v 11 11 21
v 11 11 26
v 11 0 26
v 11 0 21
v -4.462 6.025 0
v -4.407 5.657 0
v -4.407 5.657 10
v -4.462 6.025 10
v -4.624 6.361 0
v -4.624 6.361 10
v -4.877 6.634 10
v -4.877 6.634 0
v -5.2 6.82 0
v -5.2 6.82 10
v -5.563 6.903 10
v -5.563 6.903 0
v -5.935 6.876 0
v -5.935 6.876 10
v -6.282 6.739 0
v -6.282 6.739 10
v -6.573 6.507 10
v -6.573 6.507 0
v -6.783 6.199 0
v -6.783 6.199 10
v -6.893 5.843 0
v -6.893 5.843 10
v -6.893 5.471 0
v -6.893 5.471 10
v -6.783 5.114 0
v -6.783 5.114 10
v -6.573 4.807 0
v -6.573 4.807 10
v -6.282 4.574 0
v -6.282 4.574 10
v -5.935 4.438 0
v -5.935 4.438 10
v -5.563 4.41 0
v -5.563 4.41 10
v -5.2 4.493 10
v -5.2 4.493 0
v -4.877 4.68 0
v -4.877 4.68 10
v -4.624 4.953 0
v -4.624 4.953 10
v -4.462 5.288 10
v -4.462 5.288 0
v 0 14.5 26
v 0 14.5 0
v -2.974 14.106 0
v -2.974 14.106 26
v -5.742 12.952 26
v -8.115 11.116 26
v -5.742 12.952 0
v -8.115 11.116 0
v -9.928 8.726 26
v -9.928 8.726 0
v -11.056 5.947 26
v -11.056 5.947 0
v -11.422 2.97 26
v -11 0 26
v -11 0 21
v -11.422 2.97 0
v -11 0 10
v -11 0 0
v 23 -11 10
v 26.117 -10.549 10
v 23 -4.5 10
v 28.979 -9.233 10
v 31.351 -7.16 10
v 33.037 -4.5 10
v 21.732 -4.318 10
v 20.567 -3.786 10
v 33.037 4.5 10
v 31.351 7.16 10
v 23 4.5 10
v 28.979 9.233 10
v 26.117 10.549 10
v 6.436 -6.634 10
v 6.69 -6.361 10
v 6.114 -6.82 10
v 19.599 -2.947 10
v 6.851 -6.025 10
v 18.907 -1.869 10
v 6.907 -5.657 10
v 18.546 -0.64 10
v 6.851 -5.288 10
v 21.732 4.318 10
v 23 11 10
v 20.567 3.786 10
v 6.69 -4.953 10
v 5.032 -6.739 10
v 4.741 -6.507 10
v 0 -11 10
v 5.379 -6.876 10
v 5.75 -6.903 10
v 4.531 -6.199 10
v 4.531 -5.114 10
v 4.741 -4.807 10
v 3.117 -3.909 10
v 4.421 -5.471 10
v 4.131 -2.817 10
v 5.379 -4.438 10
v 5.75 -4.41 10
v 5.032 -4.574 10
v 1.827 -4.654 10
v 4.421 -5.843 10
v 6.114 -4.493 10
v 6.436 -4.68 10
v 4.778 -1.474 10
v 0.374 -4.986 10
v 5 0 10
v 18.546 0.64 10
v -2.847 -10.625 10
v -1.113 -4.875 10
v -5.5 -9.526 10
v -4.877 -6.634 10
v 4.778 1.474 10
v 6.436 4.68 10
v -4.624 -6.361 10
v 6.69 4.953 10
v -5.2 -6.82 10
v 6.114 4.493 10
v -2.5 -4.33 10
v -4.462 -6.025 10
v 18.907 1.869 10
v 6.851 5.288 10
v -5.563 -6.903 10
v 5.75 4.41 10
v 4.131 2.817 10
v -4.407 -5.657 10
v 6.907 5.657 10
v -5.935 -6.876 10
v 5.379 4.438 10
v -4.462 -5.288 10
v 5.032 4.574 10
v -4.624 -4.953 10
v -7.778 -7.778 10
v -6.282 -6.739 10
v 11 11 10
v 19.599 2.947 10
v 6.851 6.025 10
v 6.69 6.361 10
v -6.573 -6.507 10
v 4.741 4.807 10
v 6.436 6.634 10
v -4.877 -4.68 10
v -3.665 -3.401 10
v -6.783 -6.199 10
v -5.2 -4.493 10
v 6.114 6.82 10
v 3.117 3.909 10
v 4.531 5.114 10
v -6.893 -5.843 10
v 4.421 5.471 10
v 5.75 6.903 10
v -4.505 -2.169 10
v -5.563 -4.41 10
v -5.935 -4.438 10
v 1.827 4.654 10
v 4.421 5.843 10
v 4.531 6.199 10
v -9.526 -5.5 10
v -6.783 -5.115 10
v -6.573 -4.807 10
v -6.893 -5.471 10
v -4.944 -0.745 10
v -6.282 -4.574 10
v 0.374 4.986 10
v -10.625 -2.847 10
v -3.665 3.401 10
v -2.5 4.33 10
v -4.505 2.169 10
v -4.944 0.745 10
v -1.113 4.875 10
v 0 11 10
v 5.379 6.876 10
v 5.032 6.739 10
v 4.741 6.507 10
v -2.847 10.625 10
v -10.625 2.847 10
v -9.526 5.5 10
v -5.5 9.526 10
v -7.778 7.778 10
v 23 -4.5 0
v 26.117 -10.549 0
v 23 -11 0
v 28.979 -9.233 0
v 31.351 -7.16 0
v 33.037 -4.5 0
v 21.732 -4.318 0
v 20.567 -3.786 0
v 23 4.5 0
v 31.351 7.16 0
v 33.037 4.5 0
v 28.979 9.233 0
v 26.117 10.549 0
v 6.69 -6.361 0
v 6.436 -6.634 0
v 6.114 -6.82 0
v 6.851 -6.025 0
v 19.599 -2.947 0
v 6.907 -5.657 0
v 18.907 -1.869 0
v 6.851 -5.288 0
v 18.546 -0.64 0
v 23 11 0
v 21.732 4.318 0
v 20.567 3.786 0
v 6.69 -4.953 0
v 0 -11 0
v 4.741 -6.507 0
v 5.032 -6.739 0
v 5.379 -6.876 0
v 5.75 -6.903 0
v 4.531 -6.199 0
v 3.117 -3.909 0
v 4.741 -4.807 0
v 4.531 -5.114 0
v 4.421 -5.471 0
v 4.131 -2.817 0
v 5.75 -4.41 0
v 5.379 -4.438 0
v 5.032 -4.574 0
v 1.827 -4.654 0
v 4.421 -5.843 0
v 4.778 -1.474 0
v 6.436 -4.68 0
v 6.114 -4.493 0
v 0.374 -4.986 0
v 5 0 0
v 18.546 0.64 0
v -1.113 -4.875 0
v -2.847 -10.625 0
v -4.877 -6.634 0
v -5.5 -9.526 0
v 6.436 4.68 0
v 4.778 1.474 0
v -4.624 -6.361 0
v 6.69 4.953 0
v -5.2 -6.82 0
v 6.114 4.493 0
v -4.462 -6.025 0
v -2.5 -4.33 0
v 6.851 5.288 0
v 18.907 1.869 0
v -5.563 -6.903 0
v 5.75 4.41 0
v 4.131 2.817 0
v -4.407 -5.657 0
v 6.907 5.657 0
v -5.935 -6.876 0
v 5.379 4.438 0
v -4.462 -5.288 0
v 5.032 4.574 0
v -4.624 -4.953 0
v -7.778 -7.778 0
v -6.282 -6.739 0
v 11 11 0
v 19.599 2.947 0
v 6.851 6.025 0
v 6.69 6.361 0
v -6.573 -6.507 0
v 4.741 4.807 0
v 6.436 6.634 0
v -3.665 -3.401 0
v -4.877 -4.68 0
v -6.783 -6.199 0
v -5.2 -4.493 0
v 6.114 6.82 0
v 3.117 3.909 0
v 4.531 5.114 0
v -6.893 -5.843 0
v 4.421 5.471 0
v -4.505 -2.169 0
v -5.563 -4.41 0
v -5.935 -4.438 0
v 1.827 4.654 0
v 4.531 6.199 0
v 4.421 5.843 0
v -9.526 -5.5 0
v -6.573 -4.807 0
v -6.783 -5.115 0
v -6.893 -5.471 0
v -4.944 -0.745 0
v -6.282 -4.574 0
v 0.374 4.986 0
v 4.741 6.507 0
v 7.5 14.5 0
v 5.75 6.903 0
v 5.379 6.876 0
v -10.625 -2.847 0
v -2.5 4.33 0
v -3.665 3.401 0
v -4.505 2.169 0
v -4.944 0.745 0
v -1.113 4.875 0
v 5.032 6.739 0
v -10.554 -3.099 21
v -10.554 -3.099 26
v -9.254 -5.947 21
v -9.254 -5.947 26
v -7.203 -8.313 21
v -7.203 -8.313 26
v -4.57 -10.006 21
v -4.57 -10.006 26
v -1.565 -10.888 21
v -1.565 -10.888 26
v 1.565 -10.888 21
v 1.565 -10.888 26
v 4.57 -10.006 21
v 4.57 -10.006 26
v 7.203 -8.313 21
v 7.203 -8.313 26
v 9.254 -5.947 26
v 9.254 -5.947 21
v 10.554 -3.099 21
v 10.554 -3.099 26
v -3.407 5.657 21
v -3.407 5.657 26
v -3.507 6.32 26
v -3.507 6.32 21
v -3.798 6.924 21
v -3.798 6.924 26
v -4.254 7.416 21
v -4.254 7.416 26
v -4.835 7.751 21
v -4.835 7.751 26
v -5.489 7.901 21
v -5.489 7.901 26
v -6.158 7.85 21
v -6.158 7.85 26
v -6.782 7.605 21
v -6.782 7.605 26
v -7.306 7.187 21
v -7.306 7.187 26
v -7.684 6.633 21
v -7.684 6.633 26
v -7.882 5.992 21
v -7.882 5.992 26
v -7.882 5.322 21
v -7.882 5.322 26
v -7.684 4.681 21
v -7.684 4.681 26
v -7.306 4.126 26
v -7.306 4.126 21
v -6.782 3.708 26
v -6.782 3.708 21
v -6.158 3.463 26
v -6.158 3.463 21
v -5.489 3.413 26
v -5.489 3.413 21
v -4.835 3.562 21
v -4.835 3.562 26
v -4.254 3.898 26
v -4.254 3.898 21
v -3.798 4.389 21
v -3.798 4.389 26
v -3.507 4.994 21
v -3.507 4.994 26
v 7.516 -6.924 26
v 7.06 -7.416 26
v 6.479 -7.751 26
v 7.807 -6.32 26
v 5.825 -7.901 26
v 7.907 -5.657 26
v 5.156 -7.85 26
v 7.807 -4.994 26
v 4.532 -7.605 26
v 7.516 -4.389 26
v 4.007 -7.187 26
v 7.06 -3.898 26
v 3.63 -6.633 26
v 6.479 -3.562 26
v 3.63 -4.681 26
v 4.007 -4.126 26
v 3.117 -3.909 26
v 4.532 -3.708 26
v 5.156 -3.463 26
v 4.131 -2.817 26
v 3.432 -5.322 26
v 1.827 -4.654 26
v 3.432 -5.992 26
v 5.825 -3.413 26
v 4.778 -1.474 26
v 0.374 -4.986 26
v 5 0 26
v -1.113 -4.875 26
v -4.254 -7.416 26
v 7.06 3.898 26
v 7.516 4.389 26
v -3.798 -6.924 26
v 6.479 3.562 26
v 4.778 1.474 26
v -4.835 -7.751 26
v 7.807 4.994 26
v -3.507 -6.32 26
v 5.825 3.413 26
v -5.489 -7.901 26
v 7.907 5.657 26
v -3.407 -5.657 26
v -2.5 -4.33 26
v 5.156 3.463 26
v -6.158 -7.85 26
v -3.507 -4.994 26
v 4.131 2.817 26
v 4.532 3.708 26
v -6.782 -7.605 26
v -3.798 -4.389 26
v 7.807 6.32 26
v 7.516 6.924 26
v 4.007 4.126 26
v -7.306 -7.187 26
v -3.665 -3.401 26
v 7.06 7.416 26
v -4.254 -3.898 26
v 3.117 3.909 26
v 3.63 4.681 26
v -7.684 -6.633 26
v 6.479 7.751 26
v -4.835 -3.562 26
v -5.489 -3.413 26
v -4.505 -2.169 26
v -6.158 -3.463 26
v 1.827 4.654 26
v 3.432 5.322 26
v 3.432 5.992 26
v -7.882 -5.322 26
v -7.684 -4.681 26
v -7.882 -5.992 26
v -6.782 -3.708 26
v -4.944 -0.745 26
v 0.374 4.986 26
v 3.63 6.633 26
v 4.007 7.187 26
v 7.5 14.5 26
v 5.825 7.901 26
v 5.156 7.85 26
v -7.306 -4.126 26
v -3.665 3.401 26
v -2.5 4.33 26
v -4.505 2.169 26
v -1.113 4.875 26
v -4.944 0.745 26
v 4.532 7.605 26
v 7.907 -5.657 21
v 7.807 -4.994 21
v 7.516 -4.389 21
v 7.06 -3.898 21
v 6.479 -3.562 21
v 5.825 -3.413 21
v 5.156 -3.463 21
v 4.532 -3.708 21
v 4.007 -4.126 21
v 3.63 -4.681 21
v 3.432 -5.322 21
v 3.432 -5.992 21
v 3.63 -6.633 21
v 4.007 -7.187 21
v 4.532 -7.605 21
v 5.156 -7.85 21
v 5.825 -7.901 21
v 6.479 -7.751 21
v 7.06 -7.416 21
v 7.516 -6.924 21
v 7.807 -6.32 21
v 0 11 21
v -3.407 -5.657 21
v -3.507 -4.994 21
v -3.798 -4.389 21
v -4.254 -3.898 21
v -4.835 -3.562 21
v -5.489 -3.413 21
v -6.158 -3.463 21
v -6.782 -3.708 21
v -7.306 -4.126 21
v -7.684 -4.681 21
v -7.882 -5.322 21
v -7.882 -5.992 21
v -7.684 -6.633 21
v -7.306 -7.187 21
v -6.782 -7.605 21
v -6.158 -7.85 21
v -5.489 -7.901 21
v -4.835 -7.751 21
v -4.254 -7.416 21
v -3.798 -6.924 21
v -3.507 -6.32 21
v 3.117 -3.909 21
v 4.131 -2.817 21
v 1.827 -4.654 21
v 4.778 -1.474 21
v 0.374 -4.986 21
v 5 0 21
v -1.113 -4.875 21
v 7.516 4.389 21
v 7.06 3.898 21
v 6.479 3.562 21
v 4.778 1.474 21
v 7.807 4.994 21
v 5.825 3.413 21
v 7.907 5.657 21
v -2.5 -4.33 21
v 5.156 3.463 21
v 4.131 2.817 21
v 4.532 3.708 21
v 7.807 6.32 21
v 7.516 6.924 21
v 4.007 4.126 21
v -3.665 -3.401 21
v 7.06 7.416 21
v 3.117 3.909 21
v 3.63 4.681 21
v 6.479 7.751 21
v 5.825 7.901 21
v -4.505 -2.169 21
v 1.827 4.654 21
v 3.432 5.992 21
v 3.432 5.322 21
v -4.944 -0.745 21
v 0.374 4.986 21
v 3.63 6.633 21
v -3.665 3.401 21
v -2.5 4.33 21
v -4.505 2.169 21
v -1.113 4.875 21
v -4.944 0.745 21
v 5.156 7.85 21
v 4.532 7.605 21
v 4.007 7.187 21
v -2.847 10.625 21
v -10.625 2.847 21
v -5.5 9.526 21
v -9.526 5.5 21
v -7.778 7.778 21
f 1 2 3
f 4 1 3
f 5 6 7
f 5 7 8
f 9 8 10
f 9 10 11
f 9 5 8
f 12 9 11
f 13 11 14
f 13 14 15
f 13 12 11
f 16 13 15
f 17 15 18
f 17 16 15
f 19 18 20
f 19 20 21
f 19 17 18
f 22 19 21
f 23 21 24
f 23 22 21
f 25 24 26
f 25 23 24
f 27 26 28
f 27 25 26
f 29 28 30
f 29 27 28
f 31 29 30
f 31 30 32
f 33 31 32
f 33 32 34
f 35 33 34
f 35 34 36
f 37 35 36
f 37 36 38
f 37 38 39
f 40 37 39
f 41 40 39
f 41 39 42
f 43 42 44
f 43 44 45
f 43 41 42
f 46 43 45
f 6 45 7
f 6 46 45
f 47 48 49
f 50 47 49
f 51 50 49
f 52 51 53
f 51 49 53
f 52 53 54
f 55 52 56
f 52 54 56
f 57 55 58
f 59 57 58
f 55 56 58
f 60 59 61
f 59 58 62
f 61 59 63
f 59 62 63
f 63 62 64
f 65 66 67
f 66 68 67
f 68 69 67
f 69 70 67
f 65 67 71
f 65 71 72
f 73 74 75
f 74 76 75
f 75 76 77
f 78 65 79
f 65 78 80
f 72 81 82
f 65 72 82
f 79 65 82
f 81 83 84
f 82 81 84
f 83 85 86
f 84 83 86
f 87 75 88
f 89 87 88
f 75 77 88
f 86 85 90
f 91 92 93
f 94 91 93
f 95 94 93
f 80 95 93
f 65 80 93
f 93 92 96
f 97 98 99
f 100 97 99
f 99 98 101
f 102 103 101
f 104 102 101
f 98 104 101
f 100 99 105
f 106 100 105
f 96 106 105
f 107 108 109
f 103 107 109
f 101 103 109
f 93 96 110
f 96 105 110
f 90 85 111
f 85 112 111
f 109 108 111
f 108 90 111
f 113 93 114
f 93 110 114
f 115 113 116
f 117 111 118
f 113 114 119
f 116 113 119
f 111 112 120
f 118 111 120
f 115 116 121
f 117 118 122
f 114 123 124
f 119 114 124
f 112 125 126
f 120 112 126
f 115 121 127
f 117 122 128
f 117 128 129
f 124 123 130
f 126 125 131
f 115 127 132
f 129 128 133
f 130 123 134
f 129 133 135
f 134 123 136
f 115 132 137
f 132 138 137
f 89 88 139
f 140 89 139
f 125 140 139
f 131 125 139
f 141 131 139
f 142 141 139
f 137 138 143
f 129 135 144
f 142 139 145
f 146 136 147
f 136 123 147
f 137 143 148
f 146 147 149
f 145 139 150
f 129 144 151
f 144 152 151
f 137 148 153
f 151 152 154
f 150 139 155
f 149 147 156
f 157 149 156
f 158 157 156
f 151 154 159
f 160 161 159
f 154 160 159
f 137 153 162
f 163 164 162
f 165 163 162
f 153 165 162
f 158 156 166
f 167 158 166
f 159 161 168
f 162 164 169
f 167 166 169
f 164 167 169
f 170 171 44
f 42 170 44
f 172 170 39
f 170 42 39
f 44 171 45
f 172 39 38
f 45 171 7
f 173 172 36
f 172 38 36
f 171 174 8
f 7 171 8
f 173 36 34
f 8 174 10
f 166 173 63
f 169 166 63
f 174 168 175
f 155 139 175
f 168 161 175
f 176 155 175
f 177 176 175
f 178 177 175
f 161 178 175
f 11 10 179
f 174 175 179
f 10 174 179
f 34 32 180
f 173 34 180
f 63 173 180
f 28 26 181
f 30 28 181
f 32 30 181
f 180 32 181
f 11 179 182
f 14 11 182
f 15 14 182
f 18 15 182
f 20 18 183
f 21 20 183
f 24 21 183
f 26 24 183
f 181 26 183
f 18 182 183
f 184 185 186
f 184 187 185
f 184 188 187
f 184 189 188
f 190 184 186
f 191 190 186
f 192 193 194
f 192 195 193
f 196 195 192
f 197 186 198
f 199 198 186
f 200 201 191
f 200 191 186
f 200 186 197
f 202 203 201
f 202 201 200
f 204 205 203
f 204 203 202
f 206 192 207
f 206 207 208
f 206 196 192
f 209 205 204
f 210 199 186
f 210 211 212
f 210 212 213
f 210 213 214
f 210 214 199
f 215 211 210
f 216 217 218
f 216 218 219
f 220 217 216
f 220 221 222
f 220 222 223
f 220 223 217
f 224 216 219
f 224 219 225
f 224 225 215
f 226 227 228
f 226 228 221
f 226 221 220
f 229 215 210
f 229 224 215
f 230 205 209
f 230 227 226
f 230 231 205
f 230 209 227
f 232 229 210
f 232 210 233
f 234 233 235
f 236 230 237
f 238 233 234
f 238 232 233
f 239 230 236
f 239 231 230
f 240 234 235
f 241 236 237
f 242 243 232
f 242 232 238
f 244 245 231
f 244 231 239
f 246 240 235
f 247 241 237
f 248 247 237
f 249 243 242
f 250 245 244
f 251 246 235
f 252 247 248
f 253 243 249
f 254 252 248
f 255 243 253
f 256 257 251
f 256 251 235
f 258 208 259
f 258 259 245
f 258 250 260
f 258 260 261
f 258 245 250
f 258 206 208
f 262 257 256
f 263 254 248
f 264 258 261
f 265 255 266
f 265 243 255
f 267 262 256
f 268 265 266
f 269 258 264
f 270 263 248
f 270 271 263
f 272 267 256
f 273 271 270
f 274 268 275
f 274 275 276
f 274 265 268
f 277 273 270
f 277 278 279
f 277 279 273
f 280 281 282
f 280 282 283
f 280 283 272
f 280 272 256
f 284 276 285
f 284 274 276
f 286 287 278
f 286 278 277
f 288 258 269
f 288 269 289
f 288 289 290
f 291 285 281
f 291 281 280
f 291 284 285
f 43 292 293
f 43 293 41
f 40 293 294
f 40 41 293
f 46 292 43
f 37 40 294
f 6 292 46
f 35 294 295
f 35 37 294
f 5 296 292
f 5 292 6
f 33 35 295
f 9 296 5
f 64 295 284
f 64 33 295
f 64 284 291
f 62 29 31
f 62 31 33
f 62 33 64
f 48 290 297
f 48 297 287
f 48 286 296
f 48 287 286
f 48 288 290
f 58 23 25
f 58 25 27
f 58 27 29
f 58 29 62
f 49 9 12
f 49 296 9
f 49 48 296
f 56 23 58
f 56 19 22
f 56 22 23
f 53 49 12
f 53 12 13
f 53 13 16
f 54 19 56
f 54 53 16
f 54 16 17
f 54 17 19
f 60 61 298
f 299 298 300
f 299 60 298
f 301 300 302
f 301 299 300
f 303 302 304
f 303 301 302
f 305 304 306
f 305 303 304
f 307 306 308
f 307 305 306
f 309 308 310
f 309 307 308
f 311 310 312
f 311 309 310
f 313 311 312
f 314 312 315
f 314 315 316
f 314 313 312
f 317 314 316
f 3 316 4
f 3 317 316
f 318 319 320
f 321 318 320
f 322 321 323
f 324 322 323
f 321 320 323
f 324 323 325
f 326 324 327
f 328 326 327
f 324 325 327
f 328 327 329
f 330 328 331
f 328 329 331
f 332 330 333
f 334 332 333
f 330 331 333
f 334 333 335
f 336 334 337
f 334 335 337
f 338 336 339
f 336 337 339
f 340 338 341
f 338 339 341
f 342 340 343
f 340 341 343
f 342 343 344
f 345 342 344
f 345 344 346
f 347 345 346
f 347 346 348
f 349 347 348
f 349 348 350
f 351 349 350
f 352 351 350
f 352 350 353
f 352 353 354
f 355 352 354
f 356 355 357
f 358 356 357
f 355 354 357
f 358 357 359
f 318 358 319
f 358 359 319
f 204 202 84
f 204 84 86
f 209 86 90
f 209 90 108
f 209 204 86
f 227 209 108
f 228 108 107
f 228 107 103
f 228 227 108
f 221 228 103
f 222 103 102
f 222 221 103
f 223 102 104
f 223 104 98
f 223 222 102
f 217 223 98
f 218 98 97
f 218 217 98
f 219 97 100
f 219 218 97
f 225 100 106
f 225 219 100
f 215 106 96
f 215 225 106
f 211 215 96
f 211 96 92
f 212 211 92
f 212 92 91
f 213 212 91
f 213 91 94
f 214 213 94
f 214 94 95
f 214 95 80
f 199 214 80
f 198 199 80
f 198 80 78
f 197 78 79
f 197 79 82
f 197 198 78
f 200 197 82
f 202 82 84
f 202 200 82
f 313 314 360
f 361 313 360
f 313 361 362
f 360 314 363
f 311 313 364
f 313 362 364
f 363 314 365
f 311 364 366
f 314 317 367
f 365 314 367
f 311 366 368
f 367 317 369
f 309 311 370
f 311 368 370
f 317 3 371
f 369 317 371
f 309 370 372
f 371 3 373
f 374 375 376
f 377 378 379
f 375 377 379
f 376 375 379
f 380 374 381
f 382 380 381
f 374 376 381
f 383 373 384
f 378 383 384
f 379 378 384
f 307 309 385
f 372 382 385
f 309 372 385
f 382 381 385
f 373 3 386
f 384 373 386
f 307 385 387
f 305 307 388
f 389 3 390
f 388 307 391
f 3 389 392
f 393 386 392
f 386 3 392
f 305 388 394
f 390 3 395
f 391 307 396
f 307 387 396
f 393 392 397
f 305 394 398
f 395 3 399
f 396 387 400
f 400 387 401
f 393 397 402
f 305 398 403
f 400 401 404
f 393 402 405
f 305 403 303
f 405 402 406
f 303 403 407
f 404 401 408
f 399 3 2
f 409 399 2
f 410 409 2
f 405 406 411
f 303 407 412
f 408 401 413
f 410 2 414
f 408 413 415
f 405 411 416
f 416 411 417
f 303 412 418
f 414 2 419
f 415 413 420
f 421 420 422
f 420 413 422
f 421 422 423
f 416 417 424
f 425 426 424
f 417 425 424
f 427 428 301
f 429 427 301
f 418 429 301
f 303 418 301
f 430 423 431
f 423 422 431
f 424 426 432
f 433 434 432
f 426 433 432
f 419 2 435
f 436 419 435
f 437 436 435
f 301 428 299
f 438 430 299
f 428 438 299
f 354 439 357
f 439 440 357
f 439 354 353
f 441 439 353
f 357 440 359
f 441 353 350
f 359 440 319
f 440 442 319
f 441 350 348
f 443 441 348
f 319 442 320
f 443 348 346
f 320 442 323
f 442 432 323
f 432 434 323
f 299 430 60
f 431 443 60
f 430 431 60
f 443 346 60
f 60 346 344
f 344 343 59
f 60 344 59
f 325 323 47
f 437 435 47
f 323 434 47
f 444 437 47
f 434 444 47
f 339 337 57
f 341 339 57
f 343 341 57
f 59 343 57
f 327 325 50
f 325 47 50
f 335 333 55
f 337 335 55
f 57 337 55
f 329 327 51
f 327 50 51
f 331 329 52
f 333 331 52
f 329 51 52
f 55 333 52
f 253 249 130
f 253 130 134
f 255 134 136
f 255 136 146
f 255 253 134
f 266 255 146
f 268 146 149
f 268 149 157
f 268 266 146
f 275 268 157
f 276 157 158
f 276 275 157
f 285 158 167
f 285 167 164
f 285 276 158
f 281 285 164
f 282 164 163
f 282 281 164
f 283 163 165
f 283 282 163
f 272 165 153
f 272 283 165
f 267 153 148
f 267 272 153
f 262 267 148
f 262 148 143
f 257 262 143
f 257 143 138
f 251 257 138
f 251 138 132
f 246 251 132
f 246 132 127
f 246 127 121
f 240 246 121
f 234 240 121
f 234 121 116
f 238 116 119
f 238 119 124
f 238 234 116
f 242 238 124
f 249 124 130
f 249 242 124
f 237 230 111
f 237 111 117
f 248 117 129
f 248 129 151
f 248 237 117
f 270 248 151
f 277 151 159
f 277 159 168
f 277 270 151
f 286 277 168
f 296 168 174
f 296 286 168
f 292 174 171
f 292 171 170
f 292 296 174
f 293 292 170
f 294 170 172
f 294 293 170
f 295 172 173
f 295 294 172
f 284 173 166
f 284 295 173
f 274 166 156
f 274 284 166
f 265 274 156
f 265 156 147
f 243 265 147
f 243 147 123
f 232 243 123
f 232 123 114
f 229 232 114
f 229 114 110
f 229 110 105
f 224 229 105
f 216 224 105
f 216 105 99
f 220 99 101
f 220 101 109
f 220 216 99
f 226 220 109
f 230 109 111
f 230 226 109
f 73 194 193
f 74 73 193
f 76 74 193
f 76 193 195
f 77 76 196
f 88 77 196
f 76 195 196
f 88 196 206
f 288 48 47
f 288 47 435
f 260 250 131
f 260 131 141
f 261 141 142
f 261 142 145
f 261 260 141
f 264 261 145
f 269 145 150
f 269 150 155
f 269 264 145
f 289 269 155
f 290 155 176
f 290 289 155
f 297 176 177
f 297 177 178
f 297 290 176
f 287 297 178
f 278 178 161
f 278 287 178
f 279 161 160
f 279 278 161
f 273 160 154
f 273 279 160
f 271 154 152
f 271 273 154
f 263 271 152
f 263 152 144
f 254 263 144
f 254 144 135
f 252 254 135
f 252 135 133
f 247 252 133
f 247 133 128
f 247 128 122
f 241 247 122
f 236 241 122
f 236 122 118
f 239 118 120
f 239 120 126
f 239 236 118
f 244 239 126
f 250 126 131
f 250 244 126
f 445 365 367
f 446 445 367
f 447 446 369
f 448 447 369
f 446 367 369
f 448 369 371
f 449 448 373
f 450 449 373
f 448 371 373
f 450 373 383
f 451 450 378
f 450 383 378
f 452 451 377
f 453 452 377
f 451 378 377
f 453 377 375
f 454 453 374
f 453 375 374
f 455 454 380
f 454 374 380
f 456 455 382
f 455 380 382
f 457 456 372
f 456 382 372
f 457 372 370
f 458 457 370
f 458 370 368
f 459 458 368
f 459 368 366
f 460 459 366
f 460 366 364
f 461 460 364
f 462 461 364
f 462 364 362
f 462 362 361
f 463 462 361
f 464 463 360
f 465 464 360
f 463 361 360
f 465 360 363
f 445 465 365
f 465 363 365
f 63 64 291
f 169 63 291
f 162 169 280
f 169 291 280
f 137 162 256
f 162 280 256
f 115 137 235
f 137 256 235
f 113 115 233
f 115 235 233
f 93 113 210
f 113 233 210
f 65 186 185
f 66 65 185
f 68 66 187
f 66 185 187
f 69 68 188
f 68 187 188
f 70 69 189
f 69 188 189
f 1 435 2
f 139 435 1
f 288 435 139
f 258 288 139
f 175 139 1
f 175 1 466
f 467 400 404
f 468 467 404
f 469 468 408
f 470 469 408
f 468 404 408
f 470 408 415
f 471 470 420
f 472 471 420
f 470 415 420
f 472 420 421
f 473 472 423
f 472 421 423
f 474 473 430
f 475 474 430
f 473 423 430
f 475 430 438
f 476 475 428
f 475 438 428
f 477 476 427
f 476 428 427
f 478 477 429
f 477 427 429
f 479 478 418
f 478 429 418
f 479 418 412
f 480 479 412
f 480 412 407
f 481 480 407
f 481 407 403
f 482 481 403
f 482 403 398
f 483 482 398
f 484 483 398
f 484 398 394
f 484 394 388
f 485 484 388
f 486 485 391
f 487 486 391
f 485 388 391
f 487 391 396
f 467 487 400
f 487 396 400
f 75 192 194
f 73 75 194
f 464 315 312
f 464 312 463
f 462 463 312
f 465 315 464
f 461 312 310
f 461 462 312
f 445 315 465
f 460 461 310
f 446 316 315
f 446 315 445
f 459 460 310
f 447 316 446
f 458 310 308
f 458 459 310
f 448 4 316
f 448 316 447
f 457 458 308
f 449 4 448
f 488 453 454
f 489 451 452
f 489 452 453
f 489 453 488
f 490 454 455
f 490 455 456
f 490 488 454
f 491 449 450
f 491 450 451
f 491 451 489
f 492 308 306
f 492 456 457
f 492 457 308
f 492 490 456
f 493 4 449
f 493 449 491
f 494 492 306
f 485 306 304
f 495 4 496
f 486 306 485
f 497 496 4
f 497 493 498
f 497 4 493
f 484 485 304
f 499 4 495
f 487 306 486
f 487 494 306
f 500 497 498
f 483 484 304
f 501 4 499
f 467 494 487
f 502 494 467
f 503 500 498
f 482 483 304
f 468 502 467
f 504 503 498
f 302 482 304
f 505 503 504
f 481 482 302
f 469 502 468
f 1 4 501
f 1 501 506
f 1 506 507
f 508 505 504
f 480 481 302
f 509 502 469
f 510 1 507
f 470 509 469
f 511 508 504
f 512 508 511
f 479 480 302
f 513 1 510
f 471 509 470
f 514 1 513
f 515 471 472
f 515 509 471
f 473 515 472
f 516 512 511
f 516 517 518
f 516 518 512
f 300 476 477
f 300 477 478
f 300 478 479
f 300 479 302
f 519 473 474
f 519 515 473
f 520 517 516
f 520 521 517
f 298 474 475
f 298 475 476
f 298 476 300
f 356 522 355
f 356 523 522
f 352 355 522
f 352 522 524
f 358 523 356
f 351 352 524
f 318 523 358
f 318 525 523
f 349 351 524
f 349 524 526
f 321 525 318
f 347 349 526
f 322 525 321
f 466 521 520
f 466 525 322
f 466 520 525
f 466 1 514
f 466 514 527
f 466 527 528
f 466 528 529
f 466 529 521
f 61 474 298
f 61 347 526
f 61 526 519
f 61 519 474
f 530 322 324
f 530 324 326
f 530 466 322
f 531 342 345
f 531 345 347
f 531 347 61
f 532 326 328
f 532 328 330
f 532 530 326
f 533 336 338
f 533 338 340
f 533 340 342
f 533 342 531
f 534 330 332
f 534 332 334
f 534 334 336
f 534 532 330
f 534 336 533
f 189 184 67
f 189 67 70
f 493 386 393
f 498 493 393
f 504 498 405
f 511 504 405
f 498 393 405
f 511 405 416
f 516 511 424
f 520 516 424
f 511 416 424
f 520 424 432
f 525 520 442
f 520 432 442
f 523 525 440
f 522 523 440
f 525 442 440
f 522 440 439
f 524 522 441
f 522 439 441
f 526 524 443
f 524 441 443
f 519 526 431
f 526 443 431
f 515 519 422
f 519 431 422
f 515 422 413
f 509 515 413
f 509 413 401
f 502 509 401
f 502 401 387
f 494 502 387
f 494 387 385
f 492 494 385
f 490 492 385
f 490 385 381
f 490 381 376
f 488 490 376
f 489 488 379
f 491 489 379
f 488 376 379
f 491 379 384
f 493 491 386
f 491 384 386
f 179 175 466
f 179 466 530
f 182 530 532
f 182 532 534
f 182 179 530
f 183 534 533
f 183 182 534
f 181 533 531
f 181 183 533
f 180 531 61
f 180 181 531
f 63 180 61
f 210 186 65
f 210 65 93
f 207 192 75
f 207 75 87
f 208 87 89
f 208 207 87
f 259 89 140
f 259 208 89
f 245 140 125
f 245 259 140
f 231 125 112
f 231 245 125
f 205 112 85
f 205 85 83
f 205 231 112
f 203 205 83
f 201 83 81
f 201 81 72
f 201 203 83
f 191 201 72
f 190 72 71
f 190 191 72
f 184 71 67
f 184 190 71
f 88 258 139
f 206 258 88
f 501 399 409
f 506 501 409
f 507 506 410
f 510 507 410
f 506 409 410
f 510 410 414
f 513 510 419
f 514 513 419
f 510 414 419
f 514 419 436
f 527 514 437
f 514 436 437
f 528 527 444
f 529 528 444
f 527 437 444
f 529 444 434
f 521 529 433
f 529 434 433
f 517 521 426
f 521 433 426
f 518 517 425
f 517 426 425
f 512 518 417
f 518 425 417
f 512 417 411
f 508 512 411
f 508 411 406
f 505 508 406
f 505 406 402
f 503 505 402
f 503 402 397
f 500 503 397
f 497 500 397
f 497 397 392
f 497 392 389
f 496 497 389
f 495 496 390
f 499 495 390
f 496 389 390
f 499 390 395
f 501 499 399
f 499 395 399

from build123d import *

# Parameters (mm, degrees)
SKETCH_R      = 5
SKETCH_R_2    = 1.25
PAD_DEPTH     = 10
PAD001_DEPTH  = 26
SKETCH003_R   = 2.25
SKETCH003_R_2 = 5
PAD002_DEPTH  = 5


with BuildPart() as part:
    # Sketch → Pad (new body)
    with BuildSketch(Plane.XY):
        with BuildLine():
            Line((0, 11), (23, 11))
            ThreePointArc((33.0374299499, 4.5), (28.9791303716, 9.2330926563), (23, 11))
            Line((23, 4.5), (33.0374299499, 4.5))
            ThreePointArc((23, 4.5), (18.5, 0), (23, -4.5))
            Line((23, -4.5), (33.0374299499, -4.5))
            ThreePointArc((23, -11), (28.9791303716, -9.2330926563), (33.0374299499, -4.5))
            Line((23, -11), (0, -11))
            ThreePointArc((-11, 0), (-7.7781745931, -7.7781745931), (0, -11))
            ThreePointArc((0, 11), (-7.7781745931, 7.7781745931), (-11, 0))
        make_face()
        Circle(SKETCH_R, mode=Mode.SUBTRACT)
        with Locations((-5.6568608175, 5.6568476815)):
            Circle(SKETCH_R_2, mode=Mode.SUBTRACT)
        with Locations((5.6568608175, 5.6568476815)):
            Circle(SKETCH_R_2, mode=Mode.SUBTRACT)
        with Locations((5.6568608175, -5.6568476815)):
            Circle(SKETCH_R_2, mode=Mode.SUBTRACT)
        with Locations((-5.6568345454, -5.6568739536)):
            Circle(SKETCH_R_2, mode=Mode.SUBTRACT)
    extrude(amount=PAD_DEPTH)

    # Sketch002 (on Face16 of Pad) → Pad001 (join)
    with BuildSketch(Plane.XY):
        with BuildLine():
            ThreePointArc((0, 11), (-7.7781745931, 7.7781745931), (-11, 0))
            ThreePointArc((0, 14.5), (-9.1001373616, 9.9811386881), (-11, 0))
            Line((0, 14.5), (7.5, 14.5))
            Line((7.5, 14.5), (11, 11))
            Line((11, 11), (0, 11))
        make_face()
    extrude(amount=PAD001_DEPTH)

    # Sketch003 (on Face11 of Pad001) → Pad002 (join)
    with BuildSketch(Plane.XY.offset(26)):
        with BuildLine():
            Line((0, 11), (11, 11))
            Line((11, 11), (11, 0))
            ThreePointArc((0, 11), (-7.7781745931, -7.7781745931), (11, 0))
        make_face()
        with Locations((-5.6568542391, 5.6568542599)):
            Circle(SKETCH003_R, mode=Mode.SUBTRACT)
        with Locations((5.6568542391, 5.6568542599)):
            Circle(SKETCH003_R, mode=Mode.SUBTRACT)
        with Locations((5.6568542391, -5.6568542599)):
            Circle(SKETCH003_R, mode=Mode.SUBTRACT)
        with Locations((-5.6568542806, -5.6568542184)):
            Circle(SKETCH003_R, mode=Mode.SUBTRACT)
        Circle(SKETCH003_R_2, mode=Mode.SUBTRACT)
    extrude(amount=-PAD002_DEPTH)


solid = part.part
